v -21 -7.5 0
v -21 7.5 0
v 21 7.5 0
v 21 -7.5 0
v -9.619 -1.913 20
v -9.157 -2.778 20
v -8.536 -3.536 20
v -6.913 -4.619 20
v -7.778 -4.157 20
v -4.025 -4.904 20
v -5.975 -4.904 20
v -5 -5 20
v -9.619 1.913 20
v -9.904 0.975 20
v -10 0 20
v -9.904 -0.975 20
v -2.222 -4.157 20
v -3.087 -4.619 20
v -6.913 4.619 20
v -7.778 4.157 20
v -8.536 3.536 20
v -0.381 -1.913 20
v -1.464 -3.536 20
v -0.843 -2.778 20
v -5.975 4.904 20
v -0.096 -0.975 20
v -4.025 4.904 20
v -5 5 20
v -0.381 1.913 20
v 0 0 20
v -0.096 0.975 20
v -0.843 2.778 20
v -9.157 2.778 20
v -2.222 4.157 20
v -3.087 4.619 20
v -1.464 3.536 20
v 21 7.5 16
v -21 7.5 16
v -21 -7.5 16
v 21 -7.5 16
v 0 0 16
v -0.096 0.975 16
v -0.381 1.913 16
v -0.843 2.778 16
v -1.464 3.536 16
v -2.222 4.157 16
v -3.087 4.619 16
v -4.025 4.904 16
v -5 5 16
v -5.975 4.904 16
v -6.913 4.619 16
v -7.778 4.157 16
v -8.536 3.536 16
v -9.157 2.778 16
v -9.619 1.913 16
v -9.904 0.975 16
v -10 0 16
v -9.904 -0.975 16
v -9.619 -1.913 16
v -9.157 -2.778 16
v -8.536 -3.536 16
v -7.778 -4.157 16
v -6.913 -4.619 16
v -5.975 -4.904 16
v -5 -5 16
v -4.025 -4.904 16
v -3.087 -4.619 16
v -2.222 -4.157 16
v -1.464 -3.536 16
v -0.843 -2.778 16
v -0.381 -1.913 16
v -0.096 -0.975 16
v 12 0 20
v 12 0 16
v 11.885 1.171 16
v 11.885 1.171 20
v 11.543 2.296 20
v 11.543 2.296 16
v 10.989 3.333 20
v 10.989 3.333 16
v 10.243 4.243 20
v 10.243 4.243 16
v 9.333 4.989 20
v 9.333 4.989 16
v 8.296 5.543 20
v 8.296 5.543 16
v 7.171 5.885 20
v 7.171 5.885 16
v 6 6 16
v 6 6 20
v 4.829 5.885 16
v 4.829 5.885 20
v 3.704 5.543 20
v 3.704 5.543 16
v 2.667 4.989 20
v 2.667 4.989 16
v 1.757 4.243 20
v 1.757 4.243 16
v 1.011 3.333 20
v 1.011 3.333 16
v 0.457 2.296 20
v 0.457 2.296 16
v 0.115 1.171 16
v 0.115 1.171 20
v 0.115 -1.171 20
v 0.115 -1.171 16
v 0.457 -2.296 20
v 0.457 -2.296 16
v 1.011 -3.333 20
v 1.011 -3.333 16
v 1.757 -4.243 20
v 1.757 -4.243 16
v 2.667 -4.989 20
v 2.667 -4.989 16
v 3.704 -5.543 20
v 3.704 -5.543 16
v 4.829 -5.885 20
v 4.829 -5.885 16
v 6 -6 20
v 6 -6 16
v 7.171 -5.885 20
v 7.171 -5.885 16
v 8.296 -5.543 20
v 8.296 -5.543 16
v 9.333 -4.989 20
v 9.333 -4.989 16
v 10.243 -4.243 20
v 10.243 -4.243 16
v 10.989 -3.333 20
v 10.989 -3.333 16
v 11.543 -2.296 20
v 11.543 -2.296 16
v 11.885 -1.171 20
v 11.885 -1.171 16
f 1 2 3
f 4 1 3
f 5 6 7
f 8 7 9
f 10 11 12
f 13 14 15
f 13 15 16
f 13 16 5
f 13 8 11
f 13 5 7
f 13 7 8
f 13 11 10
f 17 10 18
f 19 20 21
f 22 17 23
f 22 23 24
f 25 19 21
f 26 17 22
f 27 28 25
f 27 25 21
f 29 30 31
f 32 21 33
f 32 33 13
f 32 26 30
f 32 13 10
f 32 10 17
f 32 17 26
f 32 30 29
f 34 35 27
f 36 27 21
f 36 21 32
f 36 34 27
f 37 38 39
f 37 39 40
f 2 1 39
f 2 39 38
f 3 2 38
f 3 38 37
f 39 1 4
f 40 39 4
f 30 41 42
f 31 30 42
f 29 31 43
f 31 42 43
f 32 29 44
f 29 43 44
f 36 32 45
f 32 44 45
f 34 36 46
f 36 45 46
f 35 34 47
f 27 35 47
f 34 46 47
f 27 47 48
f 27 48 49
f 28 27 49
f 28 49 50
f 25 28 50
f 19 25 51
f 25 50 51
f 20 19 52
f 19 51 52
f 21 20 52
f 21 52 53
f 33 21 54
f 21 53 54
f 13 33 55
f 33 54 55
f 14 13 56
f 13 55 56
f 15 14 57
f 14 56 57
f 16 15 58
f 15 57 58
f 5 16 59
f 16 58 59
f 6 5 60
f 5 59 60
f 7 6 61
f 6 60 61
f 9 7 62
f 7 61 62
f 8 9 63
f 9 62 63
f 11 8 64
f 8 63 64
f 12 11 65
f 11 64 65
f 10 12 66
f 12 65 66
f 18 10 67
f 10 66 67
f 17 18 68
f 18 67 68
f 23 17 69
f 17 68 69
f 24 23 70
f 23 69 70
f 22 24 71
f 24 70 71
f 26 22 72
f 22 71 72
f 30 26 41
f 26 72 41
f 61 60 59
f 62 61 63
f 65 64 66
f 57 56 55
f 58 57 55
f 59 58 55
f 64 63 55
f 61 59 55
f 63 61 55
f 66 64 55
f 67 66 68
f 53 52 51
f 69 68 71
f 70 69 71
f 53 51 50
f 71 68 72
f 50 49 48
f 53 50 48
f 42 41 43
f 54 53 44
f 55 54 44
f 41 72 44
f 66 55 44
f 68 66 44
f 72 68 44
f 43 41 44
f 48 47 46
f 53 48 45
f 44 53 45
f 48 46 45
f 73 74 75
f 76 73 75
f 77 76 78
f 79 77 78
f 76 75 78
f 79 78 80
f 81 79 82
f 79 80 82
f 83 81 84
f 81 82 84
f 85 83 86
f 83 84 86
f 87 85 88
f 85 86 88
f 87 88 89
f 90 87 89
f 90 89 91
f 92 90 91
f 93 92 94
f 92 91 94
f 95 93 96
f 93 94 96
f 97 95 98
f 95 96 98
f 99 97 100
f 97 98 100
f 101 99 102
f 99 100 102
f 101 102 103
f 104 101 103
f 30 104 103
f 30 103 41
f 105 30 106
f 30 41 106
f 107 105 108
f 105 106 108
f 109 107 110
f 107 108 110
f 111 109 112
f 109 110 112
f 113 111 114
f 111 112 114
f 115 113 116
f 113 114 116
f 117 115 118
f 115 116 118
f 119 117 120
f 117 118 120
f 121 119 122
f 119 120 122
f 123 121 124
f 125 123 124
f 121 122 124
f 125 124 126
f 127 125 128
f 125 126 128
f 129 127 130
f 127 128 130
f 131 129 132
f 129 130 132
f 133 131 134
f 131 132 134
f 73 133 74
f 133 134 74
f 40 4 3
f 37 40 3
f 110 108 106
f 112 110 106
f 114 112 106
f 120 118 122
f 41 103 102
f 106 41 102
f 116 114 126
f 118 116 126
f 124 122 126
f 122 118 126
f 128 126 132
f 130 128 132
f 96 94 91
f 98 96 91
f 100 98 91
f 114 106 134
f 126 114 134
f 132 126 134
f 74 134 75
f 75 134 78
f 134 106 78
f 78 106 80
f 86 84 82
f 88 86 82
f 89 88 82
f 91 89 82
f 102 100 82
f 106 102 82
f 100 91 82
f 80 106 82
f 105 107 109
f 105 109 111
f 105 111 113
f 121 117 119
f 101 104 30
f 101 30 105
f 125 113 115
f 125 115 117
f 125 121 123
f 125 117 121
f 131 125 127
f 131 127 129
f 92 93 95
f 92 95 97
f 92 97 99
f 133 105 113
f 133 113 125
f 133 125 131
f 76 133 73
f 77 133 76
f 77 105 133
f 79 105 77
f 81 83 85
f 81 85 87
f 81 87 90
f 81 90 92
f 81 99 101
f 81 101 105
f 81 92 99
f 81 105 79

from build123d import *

# Parameters (mm, degrees)
SKETCH3_W             = 42
SKETCH3_H             = 15
BOSS_EXTRUDE1_DEPTH   = 16
SKETCH4_R             = 5
BOSS_EXTRUDE4_DEPTH   = 4
SKETCH4_R_2           = 6
BOSS_EXTRUDE4_2_DEPTH = 4


with BuildPart() as part:
    # Sketch3 → Boss-Extrude1 (new body)
    with BuildSketch(Plane.XY):
        Rectangle(SKETCH3_W, SKETCH3_H)
    extrude(amount=BOSS_EXTRUDE1_DEPTH)


with BuildPart() as body_2:
    # Sketch4 → Boss-Extrude4 (new body)
    with BuildSketch(Plane.XY.offset(16)):
        with Locations((-5, 0)):
            Circle(SKETCH4_R)
    extrude(amount=BOSS_EXTRUDE4_DEPTH)


with BuildPart() as body_3:
    # Sketch4 → Boss-Extrude4 2 (new body)
    with BuildSketch(Plane.XY.offset(16)):
        with Locations((6, 0)):
            Circle(SKETCH4_R_2)
    extrude(amount=BOSS_EXTRUDE4_2_DEPTH)


solid = Compound([part.part, body_2.part, body_3.part])
